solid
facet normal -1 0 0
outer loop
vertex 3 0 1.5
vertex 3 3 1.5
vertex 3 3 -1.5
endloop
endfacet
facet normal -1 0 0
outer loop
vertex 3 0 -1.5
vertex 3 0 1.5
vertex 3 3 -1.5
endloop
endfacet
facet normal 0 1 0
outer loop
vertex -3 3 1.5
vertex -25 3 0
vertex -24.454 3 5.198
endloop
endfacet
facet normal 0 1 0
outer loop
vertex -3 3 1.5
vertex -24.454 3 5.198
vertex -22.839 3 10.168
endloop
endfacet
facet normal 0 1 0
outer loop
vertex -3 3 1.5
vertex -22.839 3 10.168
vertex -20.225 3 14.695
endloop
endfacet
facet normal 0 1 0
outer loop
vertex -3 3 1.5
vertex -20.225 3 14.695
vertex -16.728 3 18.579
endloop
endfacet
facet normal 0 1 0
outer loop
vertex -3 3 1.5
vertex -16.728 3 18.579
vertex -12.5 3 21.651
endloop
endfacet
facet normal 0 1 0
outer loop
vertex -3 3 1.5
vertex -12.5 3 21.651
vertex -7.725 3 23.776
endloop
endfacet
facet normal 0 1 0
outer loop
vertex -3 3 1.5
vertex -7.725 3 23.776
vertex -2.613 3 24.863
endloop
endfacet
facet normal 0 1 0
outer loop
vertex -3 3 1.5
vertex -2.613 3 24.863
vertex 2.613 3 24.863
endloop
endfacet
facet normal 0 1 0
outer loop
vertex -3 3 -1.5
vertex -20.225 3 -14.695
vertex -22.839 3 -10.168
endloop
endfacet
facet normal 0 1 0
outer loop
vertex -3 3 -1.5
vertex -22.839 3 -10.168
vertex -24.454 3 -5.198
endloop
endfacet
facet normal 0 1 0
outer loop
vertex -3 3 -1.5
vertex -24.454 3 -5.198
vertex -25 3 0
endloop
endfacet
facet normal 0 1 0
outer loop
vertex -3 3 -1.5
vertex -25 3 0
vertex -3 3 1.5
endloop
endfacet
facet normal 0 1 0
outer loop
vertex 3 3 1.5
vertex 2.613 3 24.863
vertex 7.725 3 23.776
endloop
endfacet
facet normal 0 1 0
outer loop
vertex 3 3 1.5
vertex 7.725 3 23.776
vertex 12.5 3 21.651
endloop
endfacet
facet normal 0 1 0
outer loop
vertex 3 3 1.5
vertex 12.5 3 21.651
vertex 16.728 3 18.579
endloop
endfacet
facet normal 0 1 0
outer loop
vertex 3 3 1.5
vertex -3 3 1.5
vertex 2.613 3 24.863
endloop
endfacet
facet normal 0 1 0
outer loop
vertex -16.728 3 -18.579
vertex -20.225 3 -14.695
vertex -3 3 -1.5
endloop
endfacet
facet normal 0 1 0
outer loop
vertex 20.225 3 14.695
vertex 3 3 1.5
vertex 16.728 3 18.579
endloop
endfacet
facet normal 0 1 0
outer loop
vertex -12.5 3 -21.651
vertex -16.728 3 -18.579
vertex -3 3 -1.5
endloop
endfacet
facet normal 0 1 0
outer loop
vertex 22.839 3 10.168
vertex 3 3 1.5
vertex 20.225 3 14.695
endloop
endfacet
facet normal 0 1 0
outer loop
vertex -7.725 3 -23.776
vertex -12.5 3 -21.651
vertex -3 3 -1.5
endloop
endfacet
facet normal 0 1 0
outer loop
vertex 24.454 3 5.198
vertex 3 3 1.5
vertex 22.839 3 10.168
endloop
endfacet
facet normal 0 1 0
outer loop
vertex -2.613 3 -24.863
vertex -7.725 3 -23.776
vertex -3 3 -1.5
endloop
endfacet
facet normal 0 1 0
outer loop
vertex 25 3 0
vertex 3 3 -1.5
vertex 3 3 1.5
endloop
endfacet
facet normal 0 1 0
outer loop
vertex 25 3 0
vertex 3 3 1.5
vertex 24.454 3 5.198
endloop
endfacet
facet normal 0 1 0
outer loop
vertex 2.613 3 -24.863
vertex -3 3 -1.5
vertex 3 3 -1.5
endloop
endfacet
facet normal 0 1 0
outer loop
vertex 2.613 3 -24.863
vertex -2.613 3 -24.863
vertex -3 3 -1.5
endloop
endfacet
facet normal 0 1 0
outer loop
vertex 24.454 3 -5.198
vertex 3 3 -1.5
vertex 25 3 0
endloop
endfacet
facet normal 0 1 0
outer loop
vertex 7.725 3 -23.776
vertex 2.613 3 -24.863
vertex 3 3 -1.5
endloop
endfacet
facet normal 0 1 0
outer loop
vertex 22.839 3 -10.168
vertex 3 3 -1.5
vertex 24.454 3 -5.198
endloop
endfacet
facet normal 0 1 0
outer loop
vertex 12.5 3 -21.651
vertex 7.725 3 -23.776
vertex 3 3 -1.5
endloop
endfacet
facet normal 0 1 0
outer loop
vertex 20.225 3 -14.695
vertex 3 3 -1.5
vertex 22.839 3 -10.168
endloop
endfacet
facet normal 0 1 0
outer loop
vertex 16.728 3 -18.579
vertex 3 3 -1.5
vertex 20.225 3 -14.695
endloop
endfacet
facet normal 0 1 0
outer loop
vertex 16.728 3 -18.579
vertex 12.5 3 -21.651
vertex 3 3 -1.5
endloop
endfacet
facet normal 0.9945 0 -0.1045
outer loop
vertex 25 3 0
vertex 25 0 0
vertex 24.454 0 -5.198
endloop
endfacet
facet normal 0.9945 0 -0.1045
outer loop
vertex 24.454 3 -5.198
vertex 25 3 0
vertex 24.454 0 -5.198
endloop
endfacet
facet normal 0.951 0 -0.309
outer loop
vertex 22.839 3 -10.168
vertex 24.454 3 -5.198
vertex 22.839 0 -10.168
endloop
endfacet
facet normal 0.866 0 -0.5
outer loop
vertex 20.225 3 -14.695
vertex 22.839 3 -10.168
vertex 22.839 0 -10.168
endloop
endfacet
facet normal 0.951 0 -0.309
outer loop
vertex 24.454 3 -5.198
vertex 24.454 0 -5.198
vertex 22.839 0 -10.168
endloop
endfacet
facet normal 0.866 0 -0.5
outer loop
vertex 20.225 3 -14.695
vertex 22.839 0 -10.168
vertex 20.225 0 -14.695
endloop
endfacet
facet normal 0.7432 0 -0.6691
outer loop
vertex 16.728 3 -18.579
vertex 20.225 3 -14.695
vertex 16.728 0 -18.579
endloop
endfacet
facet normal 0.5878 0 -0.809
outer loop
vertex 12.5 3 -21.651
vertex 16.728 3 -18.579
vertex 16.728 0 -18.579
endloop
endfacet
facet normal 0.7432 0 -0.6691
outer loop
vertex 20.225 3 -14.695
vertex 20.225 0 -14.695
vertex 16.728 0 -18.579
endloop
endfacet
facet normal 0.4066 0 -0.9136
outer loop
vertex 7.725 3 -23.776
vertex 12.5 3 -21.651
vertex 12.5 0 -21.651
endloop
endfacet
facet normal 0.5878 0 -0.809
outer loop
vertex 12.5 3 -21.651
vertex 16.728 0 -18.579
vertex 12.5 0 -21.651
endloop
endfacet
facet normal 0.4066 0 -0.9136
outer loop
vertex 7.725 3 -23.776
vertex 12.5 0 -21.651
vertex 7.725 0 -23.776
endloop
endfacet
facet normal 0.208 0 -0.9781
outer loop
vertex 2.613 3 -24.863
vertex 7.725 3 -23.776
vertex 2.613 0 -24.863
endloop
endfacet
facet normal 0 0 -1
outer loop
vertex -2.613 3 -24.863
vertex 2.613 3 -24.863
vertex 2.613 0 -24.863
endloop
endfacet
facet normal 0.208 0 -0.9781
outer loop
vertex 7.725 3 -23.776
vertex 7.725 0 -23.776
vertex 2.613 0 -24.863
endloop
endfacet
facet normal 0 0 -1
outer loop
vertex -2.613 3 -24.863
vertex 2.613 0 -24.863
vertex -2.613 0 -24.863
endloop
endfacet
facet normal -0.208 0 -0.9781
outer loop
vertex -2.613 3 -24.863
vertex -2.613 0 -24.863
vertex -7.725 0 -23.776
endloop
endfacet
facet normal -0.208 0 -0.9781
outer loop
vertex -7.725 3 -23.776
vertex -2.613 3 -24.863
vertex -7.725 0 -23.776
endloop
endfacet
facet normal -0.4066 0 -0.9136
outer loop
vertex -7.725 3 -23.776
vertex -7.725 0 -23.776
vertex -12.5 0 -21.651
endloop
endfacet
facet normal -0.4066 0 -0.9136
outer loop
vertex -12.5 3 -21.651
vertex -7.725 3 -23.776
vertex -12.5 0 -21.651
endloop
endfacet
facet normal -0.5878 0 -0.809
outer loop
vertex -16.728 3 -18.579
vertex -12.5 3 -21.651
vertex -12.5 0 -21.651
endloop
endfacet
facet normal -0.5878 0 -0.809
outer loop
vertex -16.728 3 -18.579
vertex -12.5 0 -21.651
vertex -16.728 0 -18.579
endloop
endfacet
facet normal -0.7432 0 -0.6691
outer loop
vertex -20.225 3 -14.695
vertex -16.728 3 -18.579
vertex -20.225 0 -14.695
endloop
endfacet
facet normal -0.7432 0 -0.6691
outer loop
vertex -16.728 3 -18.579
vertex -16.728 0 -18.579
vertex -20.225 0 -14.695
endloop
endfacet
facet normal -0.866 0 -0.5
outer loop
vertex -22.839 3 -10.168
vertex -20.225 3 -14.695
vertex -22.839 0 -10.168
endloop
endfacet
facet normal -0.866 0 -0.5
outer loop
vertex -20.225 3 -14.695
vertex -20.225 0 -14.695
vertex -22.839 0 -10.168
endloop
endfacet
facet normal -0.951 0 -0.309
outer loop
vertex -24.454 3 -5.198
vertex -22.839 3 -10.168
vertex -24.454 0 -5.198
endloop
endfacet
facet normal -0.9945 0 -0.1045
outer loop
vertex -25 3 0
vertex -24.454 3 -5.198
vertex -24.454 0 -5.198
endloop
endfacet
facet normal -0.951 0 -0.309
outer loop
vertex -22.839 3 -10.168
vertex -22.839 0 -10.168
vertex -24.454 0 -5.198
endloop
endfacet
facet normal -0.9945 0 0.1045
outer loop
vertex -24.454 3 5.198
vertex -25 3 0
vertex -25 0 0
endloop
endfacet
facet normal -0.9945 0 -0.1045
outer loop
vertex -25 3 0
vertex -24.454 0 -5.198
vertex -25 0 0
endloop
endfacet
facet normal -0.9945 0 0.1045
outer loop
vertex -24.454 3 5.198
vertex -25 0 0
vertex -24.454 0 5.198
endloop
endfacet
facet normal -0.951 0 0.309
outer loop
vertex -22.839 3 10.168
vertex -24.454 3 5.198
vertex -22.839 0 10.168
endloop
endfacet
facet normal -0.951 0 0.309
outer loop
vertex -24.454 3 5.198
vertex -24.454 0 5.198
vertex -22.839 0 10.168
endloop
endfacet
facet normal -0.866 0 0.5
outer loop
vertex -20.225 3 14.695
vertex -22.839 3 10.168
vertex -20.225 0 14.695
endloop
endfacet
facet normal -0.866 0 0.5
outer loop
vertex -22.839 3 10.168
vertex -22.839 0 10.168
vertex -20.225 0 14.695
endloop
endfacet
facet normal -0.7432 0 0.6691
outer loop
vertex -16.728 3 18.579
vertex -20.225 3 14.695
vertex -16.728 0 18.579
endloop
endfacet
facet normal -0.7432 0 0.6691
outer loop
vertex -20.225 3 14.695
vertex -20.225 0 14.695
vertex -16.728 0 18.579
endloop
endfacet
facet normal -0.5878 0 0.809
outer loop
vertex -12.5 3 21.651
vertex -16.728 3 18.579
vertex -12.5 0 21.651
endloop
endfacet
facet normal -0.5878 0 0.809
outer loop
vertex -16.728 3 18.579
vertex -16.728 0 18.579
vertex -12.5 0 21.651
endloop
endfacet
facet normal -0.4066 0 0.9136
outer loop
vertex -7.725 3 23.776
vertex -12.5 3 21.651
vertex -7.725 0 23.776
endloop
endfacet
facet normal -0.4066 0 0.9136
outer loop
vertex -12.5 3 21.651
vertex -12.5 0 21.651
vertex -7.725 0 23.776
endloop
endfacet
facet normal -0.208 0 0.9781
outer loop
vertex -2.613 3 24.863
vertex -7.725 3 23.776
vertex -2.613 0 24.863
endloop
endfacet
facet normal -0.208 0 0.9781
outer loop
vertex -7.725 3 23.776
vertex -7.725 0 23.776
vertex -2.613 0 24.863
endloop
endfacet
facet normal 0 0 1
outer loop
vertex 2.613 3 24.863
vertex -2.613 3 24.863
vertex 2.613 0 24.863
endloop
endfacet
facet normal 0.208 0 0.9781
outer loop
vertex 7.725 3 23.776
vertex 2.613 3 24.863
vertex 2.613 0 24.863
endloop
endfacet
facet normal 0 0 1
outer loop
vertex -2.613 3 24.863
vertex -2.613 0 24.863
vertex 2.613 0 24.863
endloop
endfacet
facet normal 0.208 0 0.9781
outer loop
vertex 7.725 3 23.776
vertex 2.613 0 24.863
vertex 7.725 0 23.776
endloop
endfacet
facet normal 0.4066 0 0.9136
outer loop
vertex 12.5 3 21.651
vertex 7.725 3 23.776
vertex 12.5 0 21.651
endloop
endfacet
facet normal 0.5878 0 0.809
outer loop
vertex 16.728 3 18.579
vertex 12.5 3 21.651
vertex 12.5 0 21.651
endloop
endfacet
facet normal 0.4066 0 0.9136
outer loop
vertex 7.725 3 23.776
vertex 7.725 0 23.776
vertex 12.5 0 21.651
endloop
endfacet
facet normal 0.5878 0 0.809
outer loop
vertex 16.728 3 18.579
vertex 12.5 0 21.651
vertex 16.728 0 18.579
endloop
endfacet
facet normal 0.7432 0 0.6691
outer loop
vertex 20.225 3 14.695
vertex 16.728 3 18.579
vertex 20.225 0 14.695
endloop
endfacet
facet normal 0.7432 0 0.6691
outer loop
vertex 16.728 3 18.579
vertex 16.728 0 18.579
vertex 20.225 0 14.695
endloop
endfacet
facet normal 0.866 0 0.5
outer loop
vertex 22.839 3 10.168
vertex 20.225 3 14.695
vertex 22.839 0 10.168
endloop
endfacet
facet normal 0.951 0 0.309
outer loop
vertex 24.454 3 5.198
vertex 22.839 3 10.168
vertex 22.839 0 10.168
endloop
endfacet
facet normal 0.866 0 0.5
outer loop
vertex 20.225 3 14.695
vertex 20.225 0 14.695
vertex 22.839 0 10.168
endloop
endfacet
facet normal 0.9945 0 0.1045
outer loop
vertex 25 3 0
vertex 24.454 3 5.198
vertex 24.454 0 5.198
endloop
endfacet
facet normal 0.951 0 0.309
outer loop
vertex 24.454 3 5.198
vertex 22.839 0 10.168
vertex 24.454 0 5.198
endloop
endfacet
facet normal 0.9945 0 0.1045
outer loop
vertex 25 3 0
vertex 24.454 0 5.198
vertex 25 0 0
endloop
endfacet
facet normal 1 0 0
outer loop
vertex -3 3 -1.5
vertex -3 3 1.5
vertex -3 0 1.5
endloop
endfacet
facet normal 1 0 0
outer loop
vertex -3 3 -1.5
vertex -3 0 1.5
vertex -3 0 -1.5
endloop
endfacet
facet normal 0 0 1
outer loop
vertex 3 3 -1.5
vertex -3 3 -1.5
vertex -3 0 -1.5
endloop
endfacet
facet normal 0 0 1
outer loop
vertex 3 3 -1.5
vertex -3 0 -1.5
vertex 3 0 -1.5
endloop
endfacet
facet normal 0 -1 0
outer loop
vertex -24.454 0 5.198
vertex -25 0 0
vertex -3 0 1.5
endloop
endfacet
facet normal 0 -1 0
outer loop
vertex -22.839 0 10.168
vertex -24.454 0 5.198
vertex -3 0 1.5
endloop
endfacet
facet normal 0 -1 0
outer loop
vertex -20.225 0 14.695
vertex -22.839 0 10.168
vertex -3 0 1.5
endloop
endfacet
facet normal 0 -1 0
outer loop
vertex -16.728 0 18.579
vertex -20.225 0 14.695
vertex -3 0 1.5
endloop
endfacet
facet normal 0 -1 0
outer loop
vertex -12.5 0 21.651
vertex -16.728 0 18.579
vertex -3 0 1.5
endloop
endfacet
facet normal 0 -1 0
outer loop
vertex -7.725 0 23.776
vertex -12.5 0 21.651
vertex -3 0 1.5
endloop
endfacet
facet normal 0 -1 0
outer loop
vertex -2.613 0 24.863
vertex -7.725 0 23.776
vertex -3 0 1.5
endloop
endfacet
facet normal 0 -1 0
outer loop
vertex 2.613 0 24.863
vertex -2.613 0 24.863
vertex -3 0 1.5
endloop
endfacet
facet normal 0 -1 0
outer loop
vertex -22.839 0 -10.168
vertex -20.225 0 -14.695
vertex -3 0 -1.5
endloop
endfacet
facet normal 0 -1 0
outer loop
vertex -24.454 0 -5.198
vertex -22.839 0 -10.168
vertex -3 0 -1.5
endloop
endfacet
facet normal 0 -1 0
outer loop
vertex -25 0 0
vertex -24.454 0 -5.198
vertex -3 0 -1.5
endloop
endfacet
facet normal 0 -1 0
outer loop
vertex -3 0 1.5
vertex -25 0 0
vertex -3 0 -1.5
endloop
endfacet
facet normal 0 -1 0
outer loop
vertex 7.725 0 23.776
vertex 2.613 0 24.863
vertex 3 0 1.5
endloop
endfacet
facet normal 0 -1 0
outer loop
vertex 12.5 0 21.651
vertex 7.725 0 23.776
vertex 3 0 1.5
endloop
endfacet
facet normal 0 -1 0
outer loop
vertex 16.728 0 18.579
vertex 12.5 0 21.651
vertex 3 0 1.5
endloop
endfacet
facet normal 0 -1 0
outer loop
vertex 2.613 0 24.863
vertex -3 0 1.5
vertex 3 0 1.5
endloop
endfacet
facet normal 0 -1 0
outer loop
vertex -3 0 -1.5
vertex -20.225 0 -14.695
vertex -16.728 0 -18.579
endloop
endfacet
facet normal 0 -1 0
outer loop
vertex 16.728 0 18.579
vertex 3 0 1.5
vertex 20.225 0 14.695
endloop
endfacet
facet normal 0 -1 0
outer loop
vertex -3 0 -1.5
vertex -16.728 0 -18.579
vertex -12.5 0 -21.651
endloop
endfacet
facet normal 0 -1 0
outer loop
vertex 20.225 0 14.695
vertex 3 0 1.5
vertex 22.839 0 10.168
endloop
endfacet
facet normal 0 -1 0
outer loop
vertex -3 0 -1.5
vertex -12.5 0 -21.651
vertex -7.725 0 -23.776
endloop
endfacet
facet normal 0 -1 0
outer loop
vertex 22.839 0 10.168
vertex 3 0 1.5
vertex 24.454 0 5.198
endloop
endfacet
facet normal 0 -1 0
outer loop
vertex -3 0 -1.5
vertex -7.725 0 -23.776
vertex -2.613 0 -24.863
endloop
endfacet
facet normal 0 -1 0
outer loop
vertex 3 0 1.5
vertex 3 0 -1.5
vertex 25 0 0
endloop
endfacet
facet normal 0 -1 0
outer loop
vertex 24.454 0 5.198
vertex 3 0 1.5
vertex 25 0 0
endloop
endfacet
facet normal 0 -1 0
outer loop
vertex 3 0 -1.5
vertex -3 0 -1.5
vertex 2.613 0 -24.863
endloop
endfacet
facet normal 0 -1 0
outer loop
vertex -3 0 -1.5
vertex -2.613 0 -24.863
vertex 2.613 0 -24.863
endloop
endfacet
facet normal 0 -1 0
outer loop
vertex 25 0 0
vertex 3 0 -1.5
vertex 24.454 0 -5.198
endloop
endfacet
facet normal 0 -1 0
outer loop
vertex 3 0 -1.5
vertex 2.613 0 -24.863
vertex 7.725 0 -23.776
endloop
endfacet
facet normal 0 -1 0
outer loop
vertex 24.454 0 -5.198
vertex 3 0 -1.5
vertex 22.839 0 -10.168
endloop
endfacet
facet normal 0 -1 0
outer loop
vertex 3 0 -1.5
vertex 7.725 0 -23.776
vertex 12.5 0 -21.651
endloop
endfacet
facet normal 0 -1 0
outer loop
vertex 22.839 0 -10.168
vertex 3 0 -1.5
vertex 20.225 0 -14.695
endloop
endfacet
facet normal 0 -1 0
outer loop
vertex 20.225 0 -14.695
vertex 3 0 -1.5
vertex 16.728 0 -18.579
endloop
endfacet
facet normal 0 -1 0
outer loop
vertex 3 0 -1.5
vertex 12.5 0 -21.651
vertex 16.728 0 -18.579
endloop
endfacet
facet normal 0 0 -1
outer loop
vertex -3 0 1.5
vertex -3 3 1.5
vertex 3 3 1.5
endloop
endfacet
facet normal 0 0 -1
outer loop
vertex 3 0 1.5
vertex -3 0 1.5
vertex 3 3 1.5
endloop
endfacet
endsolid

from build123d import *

# Parameters (mm, degrees)
SKETCH_1_R          = 25
EXTRUDE_1_DEPTH     = 3
SKETCH_2_W          = 6
SKETCH_2_H          = 3
CUT_EXTRUDE_2_DEPTH = 11


with BuildPart() as part:
    # 草图1 → 凸台-拉伸1 (new body)
    with BuildSketch(Plane(origin=(0, 0, 0), x_dir=(1, 0, 0), z_dir=(0, 1, 0))):
        Circle(SKETCH_1_R)
    extrude(amount=EXTRUDE_1_DEPTH)

    # 草图2 → 切除-拉伸2 (cut)
    with BuildSketch(Plane(origin=(0, 3, 0), x_dir=(1, 0, 0), z_dir=(0, 1, 0))):
        Rectangle(SKETCH_2_W, SKETCH_2_H)
    extrude(amount=-CUT_EXTRUDE_2_DEPTH, mode=Mode.SUBTRACT)


solid = part.part
